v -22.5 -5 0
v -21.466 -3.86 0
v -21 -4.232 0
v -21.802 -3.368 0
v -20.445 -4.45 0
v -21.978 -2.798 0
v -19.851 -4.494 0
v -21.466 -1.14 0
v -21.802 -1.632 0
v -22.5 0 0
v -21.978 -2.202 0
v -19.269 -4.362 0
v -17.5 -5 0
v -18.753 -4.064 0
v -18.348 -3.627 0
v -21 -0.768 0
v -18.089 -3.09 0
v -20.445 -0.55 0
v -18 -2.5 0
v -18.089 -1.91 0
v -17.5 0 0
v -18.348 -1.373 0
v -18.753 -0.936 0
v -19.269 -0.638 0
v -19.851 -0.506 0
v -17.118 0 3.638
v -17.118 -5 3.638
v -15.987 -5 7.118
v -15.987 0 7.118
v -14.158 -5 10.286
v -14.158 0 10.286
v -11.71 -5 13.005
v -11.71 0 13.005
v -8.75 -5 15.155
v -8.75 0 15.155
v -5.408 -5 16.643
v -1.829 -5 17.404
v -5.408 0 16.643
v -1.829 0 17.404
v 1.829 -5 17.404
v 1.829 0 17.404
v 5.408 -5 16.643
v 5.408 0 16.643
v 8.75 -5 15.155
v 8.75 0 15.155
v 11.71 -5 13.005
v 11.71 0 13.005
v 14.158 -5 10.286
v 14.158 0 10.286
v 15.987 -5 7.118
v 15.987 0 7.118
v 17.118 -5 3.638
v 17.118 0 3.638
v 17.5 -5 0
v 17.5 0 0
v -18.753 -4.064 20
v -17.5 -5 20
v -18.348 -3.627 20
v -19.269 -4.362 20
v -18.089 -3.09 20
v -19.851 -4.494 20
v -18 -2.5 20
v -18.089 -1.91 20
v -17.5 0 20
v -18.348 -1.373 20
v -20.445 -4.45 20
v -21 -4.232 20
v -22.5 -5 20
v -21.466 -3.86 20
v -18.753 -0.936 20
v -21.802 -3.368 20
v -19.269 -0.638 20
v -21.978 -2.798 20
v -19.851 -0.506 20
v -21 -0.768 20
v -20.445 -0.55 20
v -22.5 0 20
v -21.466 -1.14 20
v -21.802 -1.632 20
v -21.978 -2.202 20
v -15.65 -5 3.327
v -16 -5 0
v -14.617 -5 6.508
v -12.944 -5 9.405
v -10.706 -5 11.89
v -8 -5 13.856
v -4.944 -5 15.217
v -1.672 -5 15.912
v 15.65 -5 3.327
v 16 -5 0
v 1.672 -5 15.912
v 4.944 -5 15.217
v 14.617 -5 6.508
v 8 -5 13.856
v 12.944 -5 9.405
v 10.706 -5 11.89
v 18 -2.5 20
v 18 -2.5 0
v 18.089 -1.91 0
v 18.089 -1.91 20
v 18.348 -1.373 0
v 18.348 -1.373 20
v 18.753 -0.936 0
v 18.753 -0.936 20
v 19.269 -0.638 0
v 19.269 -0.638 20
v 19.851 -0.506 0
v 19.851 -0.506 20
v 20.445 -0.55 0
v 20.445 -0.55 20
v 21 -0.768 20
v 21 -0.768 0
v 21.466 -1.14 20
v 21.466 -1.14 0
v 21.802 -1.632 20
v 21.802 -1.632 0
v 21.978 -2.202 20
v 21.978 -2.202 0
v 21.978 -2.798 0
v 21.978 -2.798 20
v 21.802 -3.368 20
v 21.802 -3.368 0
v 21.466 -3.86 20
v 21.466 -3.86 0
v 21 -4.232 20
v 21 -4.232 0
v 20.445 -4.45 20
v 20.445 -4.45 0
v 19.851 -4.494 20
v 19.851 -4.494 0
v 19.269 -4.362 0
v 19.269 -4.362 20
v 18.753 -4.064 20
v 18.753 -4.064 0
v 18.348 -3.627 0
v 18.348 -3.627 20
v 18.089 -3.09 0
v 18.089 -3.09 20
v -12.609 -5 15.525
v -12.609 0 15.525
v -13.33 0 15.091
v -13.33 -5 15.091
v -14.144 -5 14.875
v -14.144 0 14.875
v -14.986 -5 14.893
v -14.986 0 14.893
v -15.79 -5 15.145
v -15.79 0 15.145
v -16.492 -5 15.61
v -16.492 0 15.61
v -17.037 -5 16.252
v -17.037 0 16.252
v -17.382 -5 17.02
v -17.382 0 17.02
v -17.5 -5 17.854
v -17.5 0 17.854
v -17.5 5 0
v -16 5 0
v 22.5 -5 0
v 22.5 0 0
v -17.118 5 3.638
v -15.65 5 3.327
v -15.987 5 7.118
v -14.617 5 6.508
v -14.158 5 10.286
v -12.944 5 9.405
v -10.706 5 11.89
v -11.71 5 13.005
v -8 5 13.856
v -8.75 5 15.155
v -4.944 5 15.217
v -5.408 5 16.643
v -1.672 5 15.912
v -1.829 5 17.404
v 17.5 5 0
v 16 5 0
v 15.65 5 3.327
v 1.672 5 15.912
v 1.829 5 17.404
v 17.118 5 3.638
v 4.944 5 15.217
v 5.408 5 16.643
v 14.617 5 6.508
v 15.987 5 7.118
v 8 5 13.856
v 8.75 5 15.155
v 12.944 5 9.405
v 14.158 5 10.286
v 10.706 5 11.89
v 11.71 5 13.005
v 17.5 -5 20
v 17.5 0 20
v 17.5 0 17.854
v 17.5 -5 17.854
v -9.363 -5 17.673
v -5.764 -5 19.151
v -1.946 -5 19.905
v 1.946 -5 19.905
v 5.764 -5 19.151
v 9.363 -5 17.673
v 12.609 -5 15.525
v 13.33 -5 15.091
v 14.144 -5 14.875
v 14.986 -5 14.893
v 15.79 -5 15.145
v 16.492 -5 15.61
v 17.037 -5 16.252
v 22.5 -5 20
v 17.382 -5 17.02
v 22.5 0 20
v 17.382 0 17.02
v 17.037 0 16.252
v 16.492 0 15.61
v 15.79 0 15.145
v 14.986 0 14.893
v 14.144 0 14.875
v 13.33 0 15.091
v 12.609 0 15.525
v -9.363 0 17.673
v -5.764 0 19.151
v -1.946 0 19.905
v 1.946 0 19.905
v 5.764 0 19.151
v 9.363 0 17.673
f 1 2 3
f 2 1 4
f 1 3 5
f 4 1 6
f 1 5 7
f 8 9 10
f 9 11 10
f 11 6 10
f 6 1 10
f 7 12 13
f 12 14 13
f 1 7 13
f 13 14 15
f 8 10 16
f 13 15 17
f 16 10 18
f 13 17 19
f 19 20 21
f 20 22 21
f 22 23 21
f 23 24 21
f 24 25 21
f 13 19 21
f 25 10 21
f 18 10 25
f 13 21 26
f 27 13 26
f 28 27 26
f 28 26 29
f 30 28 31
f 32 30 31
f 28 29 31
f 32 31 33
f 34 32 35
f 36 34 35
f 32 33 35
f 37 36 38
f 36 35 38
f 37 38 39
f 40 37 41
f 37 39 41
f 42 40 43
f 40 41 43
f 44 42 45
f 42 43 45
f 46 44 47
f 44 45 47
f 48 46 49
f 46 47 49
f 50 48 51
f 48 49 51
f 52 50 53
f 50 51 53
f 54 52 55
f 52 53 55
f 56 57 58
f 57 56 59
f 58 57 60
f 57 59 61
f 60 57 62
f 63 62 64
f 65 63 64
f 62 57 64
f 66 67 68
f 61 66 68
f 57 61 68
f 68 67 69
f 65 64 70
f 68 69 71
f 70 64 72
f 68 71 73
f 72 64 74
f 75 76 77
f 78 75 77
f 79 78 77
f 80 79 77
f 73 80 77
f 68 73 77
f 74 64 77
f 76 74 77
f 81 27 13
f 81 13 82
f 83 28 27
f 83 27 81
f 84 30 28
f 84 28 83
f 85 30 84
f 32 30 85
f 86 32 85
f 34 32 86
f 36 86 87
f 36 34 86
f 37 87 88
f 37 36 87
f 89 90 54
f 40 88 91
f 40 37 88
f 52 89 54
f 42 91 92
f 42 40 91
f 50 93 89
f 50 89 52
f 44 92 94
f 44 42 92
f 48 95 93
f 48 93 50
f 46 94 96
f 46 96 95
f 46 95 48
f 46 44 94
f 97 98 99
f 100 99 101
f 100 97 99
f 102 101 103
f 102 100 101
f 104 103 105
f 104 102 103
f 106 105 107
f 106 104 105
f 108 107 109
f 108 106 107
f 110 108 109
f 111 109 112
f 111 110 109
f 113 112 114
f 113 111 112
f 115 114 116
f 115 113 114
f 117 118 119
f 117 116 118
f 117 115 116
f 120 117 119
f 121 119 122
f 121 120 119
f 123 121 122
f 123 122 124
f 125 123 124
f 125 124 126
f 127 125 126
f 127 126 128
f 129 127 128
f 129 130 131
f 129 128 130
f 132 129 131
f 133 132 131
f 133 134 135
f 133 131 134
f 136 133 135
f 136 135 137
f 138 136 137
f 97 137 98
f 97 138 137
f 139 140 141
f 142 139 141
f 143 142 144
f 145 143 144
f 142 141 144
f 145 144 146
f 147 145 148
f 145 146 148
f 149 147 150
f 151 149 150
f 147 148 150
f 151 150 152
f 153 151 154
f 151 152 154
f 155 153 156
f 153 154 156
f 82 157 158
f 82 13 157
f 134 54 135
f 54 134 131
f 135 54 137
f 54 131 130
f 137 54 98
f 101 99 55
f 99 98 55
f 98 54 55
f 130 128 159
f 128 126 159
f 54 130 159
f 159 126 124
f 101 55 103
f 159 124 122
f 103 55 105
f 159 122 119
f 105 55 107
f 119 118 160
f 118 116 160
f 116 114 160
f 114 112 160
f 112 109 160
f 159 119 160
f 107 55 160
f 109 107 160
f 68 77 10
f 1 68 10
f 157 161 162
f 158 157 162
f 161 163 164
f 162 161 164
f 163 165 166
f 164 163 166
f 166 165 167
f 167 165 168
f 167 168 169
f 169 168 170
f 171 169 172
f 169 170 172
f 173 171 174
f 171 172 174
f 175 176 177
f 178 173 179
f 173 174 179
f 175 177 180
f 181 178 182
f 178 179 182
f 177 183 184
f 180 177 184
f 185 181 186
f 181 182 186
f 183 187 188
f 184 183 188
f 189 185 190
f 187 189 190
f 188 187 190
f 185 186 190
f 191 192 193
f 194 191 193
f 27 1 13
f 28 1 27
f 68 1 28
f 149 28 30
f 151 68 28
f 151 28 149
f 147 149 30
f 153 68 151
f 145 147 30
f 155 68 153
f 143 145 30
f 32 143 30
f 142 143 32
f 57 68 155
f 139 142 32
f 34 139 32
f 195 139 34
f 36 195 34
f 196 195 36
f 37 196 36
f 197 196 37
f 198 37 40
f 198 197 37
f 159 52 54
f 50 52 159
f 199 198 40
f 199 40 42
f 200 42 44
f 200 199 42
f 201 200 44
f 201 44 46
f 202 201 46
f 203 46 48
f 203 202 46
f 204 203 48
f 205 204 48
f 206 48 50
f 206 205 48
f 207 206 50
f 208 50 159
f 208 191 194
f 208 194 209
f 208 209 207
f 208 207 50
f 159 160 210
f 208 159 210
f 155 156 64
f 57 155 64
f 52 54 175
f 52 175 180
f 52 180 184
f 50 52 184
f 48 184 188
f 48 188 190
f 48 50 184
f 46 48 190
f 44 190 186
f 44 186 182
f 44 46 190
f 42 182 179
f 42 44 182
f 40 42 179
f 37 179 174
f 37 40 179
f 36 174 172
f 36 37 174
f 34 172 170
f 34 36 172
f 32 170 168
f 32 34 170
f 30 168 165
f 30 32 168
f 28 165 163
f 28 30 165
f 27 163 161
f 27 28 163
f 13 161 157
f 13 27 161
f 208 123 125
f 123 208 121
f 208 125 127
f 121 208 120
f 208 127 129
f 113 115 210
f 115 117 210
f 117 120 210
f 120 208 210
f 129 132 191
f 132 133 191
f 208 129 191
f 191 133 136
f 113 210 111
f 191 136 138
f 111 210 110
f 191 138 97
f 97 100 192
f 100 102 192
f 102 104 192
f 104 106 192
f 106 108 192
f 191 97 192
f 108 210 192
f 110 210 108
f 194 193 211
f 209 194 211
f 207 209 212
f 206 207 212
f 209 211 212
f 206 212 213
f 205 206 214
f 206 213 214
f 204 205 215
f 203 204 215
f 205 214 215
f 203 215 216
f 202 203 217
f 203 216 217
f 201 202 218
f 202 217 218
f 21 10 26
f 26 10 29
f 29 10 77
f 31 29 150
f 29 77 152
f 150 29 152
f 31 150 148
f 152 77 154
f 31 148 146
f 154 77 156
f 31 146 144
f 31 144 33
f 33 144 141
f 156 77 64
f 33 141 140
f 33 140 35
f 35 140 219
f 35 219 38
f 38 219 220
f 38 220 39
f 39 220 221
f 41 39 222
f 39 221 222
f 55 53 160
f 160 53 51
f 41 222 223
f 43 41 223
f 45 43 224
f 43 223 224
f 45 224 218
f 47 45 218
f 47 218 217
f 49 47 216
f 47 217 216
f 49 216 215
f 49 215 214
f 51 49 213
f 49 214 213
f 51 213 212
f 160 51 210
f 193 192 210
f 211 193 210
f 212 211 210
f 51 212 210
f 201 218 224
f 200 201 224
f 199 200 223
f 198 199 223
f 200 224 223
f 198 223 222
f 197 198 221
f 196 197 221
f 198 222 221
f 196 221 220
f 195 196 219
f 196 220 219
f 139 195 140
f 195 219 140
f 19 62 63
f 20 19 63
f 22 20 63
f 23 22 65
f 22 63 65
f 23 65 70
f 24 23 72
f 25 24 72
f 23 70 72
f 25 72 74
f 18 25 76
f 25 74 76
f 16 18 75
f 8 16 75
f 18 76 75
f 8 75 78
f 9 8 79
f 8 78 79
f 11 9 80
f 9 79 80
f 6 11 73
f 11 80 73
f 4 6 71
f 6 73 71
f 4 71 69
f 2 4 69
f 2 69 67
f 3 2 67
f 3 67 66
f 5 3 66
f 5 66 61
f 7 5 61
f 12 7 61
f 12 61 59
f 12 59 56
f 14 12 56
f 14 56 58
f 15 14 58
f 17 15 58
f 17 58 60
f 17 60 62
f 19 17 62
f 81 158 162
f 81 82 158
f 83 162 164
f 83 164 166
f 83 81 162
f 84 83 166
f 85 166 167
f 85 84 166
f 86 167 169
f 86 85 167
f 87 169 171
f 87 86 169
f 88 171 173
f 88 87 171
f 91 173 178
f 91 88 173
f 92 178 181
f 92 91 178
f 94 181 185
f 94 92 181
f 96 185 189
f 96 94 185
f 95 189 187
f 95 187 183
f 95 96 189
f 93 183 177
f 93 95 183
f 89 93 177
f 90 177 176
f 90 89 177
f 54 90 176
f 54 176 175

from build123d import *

# Parameters (mm, degrees)
F1_DEPTH = 5
F2_R     = 2
F3_DEPTH = 20.001
F5_DEPTH = 5


# Not quite as in the source:
# - a pattern or mirror of a feature is missing from the dataset's text; its kind, count and spacing are read off the source's solid


with BuildPart() as f1:
    # F0 (on Front) → F1 (new body)
    with BuildSketch(Plane.XZ):
        with BuildLine():
            ThreePointArc((-17.5, 0), (0, 17.5), (17.5, 0))
            Line((17.5, 0), (22.5, 0))
            Line((22.5, 0), (22.5, 20))
            Line((22.5, 20), (17.5, 20))
            Line((17.5, 20), (17.5, 17.8535710714))
            ThreePointArc((17.5, 17.8535710714), (15.7895904304, 15.1448893769), (12.6086956522, 15.5248444099))
            ThreePointArc((12.6086956522, 15.5248444099), (0, 20), (-12.6086956522, 15.5248444099))
            ThreePointArc((-12.6086956522, 15.5248444099), (-15.7895904304, 15.1448893769), (-17.5, 17.8535710714))
            Line((-17.5, 17.8535710714), (-17.5, 20))
            Line((-17.5, 20), (-22.5, 20))
            Line((-22.5, 20), (-22.5, 0))
            Line((-22.5, 0), (-17.5, 0))
        make_face()
    extrude(amount=F1_DEPTH)

    # F2 (on face) → F3 (cut, through all)
    with BuildSketch(Plane.XY.offset(20)):
        with Locations((-20, -2.5)):
            Circle(F2_R)
    f3 = extrude(amount=-F3_DEPTH, mode=Mode.SUBTRACT)

    # F3_copies: F3 across plane
    add(f3.mirror(Plane(origin=(0, 0, 0), x_dir=(0, 0, 1), z_dir=(1, 0, 0))), mode=Mode.SUBTRACT)


with BuildPart() as f5:
    # F4 (on Front) → F5 (new body, symmetric)
    with BuildSketch(Plane.XZ):
        with BuildLine():
            ThreePointArc((-16, 0), (0, 16), (16, 0))
            Line((16, 0), (17.5, 0))
            ThreePointArc((17.5, 0), (0, 17.5), (-17.5, 0))
            Line((-17.5, 0), (-16, 0))
        make_face()
    extrude(amount=F5_DEPTH, both=True)


solid = Compound([f1.part, f5.part])
